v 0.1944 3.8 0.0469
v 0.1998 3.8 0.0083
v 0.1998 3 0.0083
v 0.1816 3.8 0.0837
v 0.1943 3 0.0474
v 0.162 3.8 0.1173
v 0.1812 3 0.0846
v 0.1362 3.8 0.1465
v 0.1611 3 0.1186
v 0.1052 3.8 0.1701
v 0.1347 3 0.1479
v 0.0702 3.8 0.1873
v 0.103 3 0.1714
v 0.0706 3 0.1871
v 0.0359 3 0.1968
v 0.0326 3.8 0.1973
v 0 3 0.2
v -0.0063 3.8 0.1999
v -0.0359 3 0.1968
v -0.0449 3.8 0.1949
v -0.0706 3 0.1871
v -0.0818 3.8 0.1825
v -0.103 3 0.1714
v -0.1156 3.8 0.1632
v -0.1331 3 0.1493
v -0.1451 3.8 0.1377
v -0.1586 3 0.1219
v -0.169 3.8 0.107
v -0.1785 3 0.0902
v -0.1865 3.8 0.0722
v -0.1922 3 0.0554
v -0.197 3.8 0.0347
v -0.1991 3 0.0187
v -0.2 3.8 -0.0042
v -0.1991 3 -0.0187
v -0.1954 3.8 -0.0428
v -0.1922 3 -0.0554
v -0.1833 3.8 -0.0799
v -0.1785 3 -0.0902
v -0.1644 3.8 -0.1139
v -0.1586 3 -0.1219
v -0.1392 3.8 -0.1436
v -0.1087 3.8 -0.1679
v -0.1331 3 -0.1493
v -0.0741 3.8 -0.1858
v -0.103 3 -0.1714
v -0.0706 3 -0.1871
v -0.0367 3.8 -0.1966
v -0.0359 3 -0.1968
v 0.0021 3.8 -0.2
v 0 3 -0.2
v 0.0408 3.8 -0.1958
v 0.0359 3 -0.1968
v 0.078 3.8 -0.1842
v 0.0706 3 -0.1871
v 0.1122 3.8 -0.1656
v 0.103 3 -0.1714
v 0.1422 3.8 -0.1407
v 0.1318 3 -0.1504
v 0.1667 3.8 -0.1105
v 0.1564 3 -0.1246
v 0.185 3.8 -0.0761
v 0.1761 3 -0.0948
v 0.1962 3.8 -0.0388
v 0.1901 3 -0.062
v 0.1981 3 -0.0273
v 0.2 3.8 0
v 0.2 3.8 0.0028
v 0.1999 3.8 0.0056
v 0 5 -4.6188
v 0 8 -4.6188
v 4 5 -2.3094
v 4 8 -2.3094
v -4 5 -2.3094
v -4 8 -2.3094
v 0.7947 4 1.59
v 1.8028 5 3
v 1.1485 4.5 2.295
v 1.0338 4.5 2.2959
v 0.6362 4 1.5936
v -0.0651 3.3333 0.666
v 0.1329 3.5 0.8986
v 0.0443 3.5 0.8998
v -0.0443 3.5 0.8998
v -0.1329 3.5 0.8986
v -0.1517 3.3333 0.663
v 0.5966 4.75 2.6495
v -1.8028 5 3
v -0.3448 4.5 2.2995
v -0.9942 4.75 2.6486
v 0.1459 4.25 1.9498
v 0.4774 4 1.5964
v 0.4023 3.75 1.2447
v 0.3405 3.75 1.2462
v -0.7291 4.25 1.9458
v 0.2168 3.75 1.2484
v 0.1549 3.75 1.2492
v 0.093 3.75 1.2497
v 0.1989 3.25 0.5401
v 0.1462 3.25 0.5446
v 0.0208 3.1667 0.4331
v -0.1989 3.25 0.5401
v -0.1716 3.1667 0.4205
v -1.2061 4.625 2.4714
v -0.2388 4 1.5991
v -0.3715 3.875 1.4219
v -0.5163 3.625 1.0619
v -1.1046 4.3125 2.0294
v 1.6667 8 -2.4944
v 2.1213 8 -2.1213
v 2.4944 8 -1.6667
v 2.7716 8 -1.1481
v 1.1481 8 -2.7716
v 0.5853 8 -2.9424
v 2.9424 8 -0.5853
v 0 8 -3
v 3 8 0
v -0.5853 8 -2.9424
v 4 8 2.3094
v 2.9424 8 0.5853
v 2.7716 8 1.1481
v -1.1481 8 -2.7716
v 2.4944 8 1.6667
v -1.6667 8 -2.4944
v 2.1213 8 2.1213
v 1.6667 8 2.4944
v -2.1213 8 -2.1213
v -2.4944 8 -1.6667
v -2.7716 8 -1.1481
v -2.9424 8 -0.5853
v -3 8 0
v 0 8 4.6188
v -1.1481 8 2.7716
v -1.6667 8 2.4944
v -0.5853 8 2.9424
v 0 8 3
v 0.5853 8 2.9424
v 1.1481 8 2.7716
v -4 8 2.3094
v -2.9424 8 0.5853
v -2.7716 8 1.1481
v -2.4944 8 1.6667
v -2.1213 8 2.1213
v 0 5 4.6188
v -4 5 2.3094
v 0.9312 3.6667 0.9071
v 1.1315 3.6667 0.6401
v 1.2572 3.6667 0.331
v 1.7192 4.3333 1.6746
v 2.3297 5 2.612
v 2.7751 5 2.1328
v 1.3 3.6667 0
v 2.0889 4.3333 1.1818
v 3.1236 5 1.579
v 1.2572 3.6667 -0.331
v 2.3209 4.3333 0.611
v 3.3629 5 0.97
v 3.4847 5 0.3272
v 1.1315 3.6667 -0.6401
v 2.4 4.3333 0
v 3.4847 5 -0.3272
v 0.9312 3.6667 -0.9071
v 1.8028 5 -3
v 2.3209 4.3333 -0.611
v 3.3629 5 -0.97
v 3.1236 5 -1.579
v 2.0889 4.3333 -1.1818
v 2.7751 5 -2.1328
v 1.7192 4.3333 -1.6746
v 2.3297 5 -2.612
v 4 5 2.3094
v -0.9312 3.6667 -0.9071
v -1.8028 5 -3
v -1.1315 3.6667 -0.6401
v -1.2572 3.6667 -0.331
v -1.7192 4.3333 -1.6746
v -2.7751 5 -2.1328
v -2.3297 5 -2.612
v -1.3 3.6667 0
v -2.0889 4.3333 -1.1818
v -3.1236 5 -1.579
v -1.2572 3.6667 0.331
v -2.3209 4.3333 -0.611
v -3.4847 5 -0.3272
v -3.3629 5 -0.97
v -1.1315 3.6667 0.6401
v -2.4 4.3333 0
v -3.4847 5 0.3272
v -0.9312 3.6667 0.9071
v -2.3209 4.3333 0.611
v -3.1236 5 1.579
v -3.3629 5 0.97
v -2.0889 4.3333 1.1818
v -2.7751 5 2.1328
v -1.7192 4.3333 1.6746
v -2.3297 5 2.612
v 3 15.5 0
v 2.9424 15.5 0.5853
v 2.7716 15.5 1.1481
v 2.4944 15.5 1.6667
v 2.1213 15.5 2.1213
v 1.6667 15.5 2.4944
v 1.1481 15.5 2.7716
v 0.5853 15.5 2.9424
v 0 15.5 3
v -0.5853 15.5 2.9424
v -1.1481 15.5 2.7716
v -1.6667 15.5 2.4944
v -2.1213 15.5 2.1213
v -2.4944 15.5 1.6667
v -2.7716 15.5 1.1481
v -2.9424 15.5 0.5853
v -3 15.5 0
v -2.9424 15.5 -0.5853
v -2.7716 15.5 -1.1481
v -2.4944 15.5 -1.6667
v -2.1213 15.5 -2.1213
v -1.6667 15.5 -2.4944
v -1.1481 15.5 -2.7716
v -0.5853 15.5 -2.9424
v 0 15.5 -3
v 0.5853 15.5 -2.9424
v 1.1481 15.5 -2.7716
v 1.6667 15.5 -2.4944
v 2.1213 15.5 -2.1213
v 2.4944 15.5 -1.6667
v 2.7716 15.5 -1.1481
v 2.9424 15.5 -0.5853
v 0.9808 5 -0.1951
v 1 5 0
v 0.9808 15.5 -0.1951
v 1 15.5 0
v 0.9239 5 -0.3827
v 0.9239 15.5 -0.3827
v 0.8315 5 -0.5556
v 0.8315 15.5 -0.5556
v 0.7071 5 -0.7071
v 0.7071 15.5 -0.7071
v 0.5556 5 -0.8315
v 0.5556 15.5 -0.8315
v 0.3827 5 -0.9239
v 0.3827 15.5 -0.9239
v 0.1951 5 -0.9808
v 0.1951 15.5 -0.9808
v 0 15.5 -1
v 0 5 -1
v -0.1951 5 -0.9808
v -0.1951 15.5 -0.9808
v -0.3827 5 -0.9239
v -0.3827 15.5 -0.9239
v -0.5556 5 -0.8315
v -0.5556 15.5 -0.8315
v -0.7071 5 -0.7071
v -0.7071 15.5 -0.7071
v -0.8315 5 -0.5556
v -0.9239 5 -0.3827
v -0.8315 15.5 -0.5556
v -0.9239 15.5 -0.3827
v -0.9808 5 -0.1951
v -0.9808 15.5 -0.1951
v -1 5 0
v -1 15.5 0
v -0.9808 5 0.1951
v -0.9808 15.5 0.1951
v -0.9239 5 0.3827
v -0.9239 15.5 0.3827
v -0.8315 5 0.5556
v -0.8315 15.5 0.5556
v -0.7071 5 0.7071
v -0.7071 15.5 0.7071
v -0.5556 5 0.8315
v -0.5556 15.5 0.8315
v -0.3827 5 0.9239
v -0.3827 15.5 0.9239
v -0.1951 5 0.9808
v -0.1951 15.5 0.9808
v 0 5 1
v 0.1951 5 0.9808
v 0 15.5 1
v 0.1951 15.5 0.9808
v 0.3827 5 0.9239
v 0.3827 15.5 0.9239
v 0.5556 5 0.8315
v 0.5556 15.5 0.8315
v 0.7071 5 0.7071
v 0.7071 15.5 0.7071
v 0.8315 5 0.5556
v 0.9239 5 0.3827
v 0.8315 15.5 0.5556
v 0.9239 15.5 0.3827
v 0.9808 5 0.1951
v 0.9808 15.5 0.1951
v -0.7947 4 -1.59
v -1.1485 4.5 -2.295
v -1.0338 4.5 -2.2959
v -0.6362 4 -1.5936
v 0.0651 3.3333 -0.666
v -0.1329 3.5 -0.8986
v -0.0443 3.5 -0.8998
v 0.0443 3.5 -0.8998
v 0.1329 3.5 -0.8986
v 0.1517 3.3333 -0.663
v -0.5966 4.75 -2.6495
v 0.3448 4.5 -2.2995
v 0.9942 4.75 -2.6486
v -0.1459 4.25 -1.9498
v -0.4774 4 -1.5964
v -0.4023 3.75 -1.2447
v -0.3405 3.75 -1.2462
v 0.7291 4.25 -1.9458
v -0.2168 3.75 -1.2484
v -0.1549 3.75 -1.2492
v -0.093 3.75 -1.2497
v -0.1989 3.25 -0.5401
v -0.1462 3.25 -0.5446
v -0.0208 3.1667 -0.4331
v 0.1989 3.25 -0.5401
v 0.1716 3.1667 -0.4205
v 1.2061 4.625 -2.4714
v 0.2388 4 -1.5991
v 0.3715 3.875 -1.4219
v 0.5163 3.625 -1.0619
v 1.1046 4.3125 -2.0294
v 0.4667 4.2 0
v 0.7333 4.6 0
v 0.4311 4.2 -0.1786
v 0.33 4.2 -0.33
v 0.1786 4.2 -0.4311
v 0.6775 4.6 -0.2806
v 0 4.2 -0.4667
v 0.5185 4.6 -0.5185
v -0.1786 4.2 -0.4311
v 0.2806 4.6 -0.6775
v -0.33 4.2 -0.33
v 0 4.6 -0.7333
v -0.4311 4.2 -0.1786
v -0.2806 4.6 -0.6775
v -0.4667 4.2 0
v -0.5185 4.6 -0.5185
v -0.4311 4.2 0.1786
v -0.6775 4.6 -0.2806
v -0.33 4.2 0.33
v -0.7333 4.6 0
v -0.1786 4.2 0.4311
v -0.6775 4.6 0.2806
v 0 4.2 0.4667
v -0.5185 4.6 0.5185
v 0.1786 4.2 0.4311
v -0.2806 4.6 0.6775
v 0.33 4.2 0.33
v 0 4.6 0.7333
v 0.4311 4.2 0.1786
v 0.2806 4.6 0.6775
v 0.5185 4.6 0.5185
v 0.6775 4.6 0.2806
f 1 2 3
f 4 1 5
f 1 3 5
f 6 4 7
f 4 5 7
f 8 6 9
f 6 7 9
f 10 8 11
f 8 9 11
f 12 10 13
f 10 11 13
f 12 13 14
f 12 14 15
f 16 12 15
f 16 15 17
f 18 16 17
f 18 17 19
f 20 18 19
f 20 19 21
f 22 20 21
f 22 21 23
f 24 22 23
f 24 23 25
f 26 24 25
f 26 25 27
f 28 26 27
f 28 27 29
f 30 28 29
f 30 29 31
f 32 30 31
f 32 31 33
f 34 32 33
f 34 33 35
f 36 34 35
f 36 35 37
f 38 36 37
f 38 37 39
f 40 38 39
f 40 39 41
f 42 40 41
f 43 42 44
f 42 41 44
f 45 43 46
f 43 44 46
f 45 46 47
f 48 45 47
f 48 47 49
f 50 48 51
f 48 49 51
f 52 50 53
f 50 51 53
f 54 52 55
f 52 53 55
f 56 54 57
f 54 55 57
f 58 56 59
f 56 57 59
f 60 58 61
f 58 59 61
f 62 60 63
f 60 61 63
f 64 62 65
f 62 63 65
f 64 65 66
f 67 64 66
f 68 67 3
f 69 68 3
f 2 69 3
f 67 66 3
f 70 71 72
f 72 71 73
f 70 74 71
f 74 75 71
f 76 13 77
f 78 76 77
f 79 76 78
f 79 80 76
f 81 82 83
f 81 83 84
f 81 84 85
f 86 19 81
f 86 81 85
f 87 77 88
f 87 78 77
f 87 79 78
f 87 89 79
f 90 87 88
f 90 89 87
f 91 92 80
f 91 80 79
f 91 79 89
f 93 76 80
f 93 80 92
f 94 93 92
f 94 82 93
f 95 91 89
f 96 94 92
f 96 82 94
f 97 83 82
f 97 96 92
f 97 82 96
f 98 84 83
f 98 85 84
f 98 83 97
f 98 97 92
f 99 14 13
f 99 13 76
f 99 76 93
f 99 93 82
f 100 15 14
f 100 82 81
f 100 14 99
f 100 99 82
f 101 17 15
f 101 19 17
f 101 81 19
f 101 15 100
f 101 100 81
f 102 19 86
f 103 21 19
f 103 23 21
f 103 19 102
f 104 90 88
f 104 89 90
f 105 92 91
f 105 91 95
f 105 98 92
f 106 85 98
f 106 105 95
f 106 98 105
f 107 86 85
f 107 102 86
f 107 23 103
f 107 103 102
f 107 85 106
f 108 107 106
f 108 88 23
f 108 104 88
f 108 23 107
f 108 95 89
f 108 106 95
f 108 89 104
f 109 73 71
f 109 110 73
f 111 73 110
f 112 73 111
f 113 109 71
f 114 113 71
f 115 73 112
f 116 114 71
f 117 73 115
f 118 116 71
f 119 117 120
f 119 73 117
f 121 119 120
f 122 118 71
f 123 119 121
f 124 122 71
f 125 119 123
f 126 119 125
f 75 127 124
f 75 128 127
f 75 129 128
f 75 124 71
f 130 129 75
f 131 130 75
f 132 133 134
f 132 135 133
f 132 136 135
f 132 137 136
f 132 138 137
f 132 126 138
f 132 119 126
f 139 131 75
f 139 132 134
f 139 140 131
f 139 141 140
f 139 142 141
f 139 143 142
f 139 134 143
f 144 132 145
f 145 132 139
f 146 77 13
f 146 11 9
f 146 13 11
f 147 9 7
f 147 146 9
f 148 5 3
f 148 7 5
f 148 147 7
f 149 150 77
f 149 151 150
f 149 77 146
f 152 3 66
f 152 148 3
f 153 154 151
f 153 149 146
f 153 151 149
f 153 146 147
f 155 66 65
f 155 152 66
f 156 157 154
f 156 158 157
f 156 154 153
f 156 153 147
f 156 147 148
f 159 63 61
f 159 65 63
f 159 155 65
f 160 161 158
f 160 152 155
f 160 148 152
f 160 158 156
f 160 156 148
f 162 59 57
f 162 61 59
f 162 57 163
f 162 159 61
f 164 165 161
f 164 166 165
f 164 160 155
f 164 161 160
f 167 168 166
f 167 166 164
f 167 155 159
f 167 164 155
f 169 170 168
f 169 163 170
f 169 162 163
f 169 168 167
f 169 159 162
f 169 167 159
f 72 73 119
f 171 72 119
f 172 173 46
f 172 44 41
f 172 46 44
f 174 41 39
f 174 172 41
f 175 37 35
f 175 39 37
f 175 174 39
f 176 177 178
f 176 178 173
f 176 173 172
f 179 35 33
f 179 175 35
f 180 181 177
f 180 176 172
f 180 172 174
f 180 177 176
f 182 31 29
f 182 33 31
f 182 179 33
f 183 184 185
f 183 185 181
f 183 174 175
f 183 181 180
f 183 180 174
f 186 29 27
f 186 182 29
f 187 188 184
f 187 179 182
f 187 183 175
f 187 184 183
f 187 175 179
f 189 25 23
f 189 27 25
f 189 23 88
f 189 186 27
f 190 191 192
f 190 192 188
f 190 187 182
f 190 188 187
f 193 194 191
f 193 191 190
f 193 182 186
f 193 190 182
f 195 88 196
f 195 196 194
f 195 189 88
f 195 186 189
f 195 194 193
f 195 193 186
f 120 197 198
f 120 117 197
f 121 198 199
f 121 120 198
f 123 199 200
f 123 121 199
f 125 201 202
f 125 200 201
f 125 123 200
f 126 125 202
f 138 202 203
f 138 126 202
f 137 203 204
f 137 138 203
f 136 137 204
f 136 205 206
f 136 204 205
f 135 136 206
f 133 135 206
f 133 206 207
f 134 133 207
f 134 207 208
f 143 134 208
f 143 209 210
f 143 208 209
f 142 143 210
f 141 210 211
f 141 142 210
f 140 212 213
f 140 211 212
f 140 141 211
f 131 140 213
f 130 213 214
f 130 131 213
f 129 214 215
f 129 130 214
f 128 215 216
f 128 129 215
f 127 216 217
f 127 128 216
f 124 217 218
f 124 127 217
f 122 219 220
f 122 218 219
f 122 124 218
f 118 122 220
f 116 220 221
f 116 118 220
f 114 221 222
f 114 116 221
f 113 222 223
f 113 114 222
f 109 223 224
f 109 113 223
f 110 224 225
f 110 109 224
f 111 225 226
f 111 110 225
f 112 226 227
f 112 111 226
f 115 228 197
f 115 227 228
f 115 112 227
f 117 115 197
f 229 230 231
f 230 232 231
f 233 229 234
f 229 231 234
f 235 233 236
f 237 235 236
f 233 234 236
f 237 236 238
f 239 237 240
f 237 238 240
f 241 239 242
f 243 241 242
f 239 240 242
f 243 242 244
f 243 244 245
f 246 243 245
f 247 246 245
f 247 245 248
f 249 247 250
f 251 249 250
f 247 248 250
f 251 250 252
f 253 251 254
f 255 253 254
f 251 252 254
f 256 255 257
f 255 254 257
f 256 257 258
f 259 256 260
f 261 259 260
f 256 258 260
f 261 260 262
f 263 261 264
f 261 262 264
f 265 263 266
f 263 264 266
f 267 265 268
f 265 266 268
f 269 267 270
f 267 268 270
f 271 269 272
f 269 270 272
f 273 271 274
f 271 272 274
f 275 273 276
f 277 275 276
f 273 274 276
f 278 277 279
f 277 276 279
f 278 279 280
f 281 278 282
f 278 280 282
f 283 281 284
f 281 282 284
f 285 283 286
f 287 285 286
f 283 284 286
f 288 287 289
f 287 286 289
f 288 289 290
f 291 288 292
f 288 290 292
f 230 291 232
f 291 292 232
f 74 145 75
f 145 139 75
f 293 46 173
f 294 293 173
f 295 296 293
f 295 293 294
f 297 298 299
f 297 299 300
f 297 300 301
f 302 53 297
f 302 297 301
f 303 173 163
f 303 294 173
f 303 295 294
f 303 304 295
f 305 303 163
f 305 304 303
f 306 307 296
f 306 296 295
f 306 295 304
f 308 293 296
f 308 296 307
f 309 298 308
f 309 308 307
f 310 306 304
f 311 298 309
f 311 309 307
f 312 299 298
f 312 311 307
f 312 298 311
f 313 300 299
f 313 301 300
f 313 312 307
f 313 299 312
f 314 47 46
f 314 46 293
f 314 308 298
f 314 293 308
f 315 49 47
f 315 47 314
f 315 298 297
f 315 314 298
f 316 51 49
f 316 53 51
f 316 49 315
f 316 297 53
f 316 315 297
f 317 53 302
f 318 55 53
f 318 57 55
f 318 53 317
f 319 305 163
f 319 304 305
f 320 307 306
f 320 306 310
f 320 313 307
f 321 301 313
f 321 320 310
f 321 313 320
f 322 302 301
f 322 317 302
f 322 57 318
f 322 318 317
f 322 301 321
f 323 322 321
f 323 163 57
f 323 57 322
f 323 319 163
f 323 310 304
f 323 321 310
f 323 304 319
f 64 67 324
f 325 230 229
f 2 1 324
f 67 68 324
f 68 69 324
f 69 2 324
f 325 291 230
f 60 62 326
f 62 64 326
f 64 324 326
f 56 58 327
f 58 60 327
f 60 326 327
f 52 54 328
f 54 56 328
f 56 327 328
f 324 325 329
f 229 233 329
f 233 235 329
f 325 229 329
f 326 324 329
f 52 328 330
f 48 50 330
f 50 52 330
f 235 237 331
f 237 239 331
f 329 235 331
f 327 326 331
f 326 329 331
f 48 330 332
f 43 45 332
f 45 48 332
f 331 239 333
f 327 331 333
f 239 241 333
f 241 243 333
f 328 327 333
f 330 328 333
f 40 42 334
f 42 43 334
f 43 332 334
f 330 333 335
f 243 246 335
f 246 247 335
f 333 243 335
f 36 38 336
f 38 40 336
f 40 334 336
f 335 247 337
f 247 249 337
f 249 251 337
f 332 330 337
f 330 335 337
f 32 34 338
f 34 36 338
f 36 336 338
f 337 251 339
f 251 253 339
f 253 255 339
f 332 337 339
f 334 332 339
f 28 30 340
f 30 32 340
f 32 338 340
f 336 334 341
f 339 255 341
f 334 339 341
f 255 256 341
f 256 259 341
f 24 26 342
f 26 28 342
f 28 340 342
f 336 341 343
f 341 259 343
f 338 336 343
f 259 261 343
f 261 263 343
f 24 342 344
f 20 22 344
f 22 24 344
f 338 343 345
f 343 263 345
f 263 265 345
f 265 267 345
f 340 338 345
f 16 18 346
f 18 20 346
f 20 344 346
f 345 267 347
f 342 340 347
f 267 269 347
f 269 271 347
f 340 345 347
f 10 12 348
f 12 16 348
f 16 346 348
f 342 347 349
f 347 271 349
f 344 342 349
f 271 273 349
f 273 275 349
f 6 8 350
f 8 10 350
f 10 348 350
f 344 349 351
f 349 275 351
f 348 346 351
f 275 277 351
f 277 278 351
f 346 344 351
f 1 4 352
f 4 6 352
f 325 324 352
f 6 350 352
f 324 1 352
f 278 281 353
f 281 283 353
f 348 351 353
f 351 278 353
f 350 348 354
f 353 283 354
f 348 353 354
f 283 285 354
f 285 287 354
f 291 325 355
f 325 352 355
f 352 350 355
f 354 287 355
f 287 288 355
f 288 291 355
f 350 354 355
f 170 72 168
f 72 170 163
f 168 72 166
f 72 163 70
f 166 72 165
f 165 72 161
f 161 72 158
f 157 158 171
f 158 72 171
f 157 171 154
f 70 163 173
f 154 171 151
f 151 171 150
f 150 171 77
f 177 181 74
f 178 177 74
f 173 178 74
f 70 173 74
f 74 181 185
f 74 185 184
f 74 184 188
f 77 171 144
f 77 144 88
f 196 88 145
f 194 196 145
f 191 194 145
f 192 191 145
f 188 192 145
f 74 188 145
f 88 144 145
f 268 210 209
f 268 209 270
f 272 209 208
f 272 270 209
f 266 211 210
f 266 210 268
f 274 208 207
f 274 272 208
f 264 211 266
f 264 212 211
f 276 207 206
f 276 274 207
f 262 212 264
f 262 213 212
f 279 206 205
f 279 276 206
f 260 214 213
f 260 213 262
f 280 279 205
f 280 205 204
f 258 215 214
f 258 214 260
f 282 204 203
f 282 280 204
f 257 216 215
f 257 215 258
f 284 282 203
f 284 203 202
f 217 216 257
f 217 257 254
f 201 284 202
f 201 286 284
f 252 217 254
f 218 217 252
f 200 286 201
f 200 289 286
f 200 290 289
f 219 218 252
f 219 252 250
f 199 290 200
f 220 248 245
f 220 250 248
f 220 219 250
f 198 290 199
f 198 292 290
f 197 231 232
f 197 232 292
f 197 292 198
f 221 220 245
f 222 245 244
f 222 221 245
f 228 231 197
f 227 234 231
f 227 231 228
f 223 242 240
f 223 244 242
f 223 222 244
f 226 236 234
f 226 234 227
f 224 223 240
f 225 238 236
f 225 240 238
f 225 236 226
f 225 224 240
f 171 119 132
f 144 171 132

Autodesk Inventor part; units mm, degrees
ref_plane "YZ Plane" through (0, 0, 0) normal (1, 0, 0) x (0, 1, 0)
ref_plane "Plano de trabajo1" through (0, 8, 0) normal (0, 1, 0) x (-1, 0, 0)
sketch "Boceto2" plane through (0, 8, 0) normal (0, 1, 0) x (-1, 0, 0)
  line L0 (0, -4.6188) -> (-4, -2.3094)
  line L1 (-4, -2.3094) -> (-4, 2.3094)
  line L2 (-4, 2.3094) -> (0, 4.6188)
  line L3 (0, 4.6188) -> (4, 2.3094)
  line L4 (4, 2.3094) -> (4, -2.3094)
  line L5 (4, -2.3094) -> (0, -4.6188)
  point P0 (0, 0)
  point P1 (0, 0)
  dimension "d2" = 8
extrude "Extrusión1" add sketch "Boceto2" against normal blind 3
sketch "Boceto3" plane through (0, 8, 0) normal (0, 1, 0) x (1, 0, 0)
  circle A0 centre (0, 0) radius 3
  circle A1 centre (0, 0) radius 3
  dimension "d9" = 6
  dimension "d10" = 6
extrude "Extrusión2" add sketch "Boceto3" along normal blind 1
sketch "Boceto4" plane through (0, 9, 0) normal (0, 1, 0) x (1, 0, 0)
  circle A0 centre (0, 0) radius 3 projected
extrude "Extrusión3" add sketch "Boceto4" along normal blind 6.5
sketch "Boceto6" plane through (0, 15.5, 0) normal (0, 1, 0) x (1, 0, 0)
  circle A0 centre (0, 0) radius 1
  dimension "d26" = 2
extrude "Extrusión4" cut sketch "Boceto6" against normal blind 12.25
sketch "Boceto12" plane through (0, 5, 0) normal (0, -1, 0) x (1, 0, 0)
  circle A0 centre (0, 0) radius 1
  line L0 (-1.8028, 3) -> (1.8028, 3)
  arc A1 (1.8028, -3) -> (1.8028, 3) centre (0, 0) ccw
  arc A2 (-1.8028, 3) -> (-1.8028, -3) centre (0, 0) ccw
  line L1 (1.8028, -3) -> (-1.8028, -3)
ref_plane "Plano de trabajo6" through (0, 3.8, 0) normal (0, -1, 0) x (1, 0, 0)
ref_plane "Plano de trabajo5" through (0, 3, 0) normal (0, -1, 0) x (1, 0, 0)
sketch "Boceto13" plane through (0, 3, 0) normal (0, -1, 0) x (1, 0, 0)
  circle A0 centre (0, 0) radius 0.2
  dimension "d44" = 0.4
sketch "Boceto14" plane through (0, 3.8, 0) normal (0, -1, 0) x (1, 0, 0)
  circle A0 centre (0, 0) radius 0.2
  dimension "d45" = 0.4
loft "Solevación2" add profiles "Boceto12", "Boceto13" contours A0 | L0 A1 L1 A2 / all
loft "Solevación3" cut profiles "Boceto14" section 2 edges at (-1, 5, 0)
sketch "Boceto15" plane through (0, 3, 0) normal (0, -1, 0) x (0.9991294, 0, 0.0417196)
  circle A0 centre (0, 0) radius 0.2
  dimension "d54" = 0.4
extrude "Extrusión8" cut sketch "Boceto15" against normal blind 2
properties part number "boquilla 0.4" material "Latón, amarillo claro"
